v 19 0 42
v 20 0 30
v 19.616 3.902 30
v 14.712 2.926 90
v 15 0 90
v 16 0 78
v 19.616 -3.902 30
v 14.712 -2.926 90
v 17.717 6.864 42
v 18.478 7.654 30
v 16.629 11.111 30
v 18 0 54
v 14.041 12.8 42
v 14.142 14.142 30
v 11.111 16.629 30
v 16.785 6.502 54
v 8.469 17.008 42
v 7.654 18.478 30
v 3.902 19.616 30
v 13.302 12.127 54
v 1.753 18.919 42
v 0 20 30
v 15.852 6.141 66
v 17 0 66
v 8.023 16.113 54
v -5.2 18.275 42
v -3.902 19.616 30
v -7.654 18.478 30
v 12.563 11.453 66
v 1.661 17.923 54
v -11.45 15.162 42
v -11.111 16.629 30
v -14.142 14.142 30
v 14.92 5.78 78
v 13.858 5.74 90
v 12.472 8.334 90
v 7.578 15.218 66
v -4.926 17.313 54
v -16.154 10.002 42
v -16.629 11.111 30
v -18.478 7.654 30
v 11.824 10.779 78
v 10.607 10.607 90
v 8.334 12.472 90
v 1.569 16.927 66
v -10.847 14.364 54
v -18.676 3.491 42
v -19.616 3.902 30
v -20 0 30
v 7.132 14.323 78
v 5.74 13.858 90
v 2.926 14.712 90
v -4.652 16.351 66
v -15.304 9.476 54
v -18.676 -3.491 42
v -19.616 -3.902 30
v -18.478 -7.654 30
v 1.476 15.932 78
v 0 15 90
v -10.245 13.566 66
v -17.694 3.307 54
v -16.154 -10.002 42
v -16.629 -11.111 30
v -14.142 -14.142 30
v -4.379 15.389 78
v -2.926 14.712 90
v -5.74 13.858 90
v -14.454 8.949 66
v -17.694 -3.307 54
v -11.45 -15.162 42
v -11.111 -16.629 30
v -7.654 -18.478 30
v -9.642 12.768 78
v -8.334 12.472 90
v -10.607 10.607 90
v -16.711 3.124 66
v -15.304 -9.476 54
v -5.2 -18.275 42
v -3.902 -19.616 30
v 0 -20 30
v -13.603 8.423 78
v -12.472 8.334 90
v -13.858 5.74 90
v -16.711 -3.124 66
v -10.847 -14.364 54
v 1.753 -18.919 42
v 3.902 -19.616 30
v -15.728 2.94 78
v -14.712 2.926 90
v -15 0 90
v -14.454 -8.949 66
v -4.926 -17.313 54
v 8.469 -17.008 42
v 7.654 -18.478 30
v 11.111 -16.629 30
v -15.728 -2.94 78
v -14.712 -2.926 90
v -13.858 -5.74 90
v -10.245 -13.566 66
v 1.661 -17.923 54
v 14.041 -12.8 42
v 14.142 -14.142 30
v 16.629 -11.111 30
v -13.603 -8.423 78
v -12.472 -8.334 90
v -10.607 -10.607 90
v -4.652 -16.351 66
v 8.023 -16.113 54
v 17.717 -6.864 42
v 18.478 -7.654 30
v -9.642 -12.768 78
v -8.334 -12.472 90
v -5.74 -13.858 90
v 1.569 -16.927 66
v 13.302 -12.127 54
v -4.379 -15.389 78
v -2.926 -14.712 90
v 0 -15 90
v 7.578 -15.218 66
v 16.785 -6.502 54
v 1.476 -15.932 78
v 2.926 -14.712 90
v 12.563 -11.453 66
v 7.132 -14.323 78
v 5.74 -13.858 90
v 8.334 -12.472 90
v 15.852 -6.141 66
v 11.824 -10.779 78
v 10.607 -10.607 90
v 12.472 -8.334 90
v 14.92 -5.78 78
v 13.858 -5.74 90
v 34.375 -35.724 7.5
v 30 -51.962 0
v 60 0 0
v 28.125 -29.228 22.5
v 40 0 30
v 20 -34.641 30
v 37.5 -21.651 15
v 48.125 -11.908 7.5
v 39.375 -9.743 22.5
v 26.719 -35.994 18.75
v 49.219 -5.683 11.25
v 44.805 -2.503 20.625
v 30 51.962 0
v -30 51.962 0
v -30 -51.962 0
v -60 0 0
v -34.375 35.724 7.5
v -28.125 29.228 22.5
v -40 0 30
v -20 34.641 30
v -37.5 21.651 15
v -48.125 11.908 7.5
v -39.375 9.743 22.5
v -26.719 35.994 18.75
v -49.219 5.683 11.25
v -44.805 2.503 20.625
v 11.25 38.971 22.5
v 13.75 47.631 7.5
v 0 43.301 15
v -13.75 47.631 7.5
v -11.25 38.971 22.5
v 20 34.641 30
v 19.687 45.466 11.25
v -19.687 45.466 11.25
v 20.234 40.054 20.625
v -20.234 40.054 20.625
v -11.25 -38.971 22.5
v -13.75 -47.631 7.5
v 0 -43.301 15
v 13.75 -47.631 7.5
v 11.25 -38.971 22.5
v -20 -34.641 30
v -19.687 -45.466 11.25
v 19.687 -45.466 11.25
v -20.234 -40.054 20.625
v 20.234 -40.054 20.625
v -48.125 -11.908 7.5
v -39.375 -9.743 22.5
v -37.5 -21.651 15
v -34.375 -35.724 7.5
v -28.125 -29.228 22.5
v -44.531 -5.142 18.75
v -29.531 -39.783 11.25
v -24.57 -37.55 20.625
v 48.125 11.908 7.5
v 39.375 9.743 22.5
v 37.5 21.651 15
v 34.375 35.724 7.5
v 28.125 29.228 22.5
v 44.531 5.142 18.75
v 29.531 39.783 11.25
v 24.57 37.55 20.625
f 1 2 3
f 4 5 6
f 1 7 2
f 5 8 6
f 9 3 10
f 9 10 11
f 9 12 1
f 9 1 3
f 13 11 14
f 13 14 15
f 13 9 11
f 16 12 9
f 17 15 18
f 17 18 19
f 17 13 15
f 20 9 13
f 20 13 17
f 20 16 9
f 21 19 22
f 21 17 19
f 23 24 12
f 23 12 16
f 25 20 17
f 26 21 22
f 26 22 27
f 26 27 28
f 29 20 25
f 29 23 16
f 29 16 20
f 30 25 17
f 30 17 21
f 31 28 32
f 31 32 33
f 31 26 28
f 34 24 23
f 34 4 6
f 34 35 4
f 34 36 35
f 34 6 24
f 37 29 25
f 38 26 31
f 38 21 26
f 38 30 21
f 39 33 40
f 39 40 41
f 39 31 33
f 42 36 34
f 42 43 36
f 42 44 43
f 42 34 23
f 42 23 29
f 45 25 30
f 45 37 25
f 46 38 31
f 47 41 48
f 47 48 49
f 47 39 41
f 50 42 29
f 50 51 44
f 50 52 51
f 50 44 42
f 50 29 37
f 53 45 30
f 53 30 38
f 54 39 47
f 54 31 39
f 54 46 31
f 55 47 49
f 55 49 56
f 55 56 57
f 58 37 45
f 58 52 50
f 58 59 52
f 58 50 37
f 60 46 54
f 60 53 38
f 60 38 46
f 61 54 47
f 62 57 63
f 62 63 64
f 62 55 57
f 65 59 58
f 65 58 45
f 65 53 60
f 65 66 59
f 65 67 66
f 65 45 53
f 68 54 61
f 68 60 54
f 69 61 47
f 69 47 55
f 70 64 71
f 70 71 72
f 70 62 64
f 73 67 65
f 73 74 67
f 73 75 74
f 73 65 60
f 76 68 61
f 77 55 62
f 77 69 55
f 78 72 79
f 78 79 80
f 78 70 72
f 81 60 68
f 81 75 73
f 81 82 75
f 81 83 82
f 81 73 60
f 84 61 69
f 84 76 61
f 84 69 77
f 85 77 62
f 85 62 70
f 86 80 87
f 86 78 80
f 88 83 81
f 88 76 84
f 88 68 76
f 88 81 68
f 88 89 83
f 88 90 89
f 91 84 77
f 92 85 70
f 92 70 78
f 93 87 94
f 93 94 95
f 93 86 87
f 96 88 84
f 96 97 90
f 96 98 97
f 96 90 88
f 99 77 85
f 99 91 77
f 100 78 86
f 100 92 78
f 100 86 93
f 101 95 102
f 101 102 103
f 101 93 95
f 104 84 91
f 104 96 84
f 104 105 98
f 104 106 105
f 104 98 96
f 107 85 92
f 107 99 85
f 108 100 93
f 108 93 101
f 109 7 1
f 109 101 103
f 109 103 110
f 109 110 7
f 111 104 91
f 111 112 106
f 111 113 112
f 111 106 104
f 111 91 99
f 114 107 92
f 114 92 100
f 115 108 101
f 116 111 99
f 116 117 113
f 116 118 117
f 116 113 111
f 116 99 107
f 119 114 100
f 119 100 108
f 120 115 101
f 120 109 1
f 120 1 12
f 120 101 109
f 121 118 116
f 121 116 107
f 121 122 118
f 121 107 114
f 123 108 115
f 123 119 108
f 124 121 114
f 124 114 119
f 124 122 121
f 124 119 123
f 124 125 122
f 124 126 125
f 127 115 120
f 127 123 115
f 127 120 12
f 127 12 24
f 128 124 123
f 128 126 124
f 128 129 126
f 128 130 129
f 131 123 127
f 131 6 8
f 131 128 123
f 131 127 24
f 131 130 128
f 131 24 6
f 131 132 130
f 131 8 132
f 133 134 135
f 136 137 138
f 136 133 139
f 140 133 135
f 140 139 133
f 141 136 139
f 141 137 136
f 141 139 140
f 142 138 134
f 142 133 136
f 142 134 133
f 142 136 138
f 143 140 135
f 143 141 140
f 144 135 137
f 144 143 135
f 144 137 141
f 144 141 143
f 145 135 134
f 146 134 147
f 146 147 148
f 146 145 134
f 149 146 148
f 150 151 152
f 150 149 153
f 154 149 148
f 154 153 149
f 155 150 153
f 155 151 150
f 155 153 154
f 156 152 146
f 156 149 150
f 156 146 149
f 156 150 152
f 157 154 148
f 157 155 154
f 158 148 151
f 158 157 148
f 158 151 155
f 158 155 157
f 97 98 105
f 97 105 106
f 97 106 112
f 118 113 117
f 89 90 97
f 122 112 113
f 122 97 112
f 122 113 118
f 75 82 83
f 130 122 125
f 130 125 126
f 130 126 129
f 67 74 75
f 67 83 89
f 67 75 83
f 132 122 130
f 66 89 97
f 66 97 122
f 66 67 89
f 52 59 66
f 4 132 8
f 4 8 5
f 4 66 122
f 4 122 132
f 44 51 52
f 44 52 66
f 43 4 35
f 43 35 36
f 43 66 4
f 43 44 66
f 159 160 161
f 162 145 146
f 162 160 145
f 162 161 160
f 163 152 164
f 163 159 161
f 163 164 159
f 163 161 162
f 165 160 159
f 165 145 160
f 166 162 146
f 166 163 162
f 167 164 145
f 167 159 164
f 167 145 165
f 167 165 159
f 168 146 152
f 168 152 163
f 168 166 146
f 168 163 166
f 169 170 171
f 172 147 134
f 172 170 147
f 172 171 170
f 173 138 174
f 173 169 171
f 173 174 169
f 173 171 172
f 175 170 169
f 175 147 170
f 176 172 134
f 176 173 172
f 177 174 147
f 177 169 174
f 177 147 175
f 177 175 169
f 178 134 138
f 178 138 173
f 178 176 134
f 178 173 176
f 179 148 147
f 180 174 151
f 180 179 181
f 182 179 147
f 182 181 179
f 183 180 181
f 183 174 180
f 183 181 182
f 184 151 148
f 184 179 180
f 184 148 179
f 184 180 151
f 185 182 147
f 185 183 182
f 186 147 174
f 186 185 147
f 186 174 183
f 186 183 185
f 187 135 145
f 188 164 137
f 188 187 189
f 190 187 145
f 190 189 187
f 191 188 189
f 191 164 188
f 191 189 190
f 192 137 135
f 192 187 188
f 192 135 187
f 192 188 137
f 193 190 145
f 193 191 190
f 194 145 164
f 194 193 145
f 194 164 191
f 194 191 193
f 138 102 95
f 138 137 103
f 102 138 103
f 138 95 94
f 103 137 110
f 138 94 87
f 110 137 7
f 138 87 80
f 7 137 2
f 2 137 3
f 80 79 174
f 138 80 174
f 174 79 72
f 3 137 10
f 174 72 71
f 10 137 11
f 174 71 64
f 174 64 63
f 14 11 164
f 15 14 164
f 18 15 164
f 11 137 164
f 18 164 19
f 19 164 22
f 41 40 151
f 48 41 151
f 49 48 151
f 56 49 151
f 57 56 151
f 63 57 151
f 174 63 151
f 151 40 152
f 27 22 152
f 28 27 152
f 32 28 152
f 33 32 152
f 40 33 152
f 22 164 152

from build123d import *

# Parameters (mm, degrees)
F5_R = 20
F4_R = 15


with BuildPart() as f6:
    # F0 (on Top) → F6 section 0
    with BuildSketch(Plane.XY):
        Polygon((60, 0), (30, 51.961524), (-30, 51.961524), (-60, 0), (-30, -51.961524), (30, -51.961524), align=None)
    # F2 (on offset) → F6 section 1
    with BuildSketch(Plane.XY.offset(30)):
        Polygon((40, 0), (20, 34.641016), (-20, 34.641016), (-40, 0), (-20, -34.641016), (20, -34.641016), align=None)
    loft()

    # F5 (on face) → F7 section 0
    with BuildSketch(Plane.XY.offset(30)):
        Circle(F5_R)
    # F4 (on offset) → F7 section 1
    with BuildSketch(Plane.XY.offset(90)):
        Circle(F4_R)
    loft()


solid = f6.part
